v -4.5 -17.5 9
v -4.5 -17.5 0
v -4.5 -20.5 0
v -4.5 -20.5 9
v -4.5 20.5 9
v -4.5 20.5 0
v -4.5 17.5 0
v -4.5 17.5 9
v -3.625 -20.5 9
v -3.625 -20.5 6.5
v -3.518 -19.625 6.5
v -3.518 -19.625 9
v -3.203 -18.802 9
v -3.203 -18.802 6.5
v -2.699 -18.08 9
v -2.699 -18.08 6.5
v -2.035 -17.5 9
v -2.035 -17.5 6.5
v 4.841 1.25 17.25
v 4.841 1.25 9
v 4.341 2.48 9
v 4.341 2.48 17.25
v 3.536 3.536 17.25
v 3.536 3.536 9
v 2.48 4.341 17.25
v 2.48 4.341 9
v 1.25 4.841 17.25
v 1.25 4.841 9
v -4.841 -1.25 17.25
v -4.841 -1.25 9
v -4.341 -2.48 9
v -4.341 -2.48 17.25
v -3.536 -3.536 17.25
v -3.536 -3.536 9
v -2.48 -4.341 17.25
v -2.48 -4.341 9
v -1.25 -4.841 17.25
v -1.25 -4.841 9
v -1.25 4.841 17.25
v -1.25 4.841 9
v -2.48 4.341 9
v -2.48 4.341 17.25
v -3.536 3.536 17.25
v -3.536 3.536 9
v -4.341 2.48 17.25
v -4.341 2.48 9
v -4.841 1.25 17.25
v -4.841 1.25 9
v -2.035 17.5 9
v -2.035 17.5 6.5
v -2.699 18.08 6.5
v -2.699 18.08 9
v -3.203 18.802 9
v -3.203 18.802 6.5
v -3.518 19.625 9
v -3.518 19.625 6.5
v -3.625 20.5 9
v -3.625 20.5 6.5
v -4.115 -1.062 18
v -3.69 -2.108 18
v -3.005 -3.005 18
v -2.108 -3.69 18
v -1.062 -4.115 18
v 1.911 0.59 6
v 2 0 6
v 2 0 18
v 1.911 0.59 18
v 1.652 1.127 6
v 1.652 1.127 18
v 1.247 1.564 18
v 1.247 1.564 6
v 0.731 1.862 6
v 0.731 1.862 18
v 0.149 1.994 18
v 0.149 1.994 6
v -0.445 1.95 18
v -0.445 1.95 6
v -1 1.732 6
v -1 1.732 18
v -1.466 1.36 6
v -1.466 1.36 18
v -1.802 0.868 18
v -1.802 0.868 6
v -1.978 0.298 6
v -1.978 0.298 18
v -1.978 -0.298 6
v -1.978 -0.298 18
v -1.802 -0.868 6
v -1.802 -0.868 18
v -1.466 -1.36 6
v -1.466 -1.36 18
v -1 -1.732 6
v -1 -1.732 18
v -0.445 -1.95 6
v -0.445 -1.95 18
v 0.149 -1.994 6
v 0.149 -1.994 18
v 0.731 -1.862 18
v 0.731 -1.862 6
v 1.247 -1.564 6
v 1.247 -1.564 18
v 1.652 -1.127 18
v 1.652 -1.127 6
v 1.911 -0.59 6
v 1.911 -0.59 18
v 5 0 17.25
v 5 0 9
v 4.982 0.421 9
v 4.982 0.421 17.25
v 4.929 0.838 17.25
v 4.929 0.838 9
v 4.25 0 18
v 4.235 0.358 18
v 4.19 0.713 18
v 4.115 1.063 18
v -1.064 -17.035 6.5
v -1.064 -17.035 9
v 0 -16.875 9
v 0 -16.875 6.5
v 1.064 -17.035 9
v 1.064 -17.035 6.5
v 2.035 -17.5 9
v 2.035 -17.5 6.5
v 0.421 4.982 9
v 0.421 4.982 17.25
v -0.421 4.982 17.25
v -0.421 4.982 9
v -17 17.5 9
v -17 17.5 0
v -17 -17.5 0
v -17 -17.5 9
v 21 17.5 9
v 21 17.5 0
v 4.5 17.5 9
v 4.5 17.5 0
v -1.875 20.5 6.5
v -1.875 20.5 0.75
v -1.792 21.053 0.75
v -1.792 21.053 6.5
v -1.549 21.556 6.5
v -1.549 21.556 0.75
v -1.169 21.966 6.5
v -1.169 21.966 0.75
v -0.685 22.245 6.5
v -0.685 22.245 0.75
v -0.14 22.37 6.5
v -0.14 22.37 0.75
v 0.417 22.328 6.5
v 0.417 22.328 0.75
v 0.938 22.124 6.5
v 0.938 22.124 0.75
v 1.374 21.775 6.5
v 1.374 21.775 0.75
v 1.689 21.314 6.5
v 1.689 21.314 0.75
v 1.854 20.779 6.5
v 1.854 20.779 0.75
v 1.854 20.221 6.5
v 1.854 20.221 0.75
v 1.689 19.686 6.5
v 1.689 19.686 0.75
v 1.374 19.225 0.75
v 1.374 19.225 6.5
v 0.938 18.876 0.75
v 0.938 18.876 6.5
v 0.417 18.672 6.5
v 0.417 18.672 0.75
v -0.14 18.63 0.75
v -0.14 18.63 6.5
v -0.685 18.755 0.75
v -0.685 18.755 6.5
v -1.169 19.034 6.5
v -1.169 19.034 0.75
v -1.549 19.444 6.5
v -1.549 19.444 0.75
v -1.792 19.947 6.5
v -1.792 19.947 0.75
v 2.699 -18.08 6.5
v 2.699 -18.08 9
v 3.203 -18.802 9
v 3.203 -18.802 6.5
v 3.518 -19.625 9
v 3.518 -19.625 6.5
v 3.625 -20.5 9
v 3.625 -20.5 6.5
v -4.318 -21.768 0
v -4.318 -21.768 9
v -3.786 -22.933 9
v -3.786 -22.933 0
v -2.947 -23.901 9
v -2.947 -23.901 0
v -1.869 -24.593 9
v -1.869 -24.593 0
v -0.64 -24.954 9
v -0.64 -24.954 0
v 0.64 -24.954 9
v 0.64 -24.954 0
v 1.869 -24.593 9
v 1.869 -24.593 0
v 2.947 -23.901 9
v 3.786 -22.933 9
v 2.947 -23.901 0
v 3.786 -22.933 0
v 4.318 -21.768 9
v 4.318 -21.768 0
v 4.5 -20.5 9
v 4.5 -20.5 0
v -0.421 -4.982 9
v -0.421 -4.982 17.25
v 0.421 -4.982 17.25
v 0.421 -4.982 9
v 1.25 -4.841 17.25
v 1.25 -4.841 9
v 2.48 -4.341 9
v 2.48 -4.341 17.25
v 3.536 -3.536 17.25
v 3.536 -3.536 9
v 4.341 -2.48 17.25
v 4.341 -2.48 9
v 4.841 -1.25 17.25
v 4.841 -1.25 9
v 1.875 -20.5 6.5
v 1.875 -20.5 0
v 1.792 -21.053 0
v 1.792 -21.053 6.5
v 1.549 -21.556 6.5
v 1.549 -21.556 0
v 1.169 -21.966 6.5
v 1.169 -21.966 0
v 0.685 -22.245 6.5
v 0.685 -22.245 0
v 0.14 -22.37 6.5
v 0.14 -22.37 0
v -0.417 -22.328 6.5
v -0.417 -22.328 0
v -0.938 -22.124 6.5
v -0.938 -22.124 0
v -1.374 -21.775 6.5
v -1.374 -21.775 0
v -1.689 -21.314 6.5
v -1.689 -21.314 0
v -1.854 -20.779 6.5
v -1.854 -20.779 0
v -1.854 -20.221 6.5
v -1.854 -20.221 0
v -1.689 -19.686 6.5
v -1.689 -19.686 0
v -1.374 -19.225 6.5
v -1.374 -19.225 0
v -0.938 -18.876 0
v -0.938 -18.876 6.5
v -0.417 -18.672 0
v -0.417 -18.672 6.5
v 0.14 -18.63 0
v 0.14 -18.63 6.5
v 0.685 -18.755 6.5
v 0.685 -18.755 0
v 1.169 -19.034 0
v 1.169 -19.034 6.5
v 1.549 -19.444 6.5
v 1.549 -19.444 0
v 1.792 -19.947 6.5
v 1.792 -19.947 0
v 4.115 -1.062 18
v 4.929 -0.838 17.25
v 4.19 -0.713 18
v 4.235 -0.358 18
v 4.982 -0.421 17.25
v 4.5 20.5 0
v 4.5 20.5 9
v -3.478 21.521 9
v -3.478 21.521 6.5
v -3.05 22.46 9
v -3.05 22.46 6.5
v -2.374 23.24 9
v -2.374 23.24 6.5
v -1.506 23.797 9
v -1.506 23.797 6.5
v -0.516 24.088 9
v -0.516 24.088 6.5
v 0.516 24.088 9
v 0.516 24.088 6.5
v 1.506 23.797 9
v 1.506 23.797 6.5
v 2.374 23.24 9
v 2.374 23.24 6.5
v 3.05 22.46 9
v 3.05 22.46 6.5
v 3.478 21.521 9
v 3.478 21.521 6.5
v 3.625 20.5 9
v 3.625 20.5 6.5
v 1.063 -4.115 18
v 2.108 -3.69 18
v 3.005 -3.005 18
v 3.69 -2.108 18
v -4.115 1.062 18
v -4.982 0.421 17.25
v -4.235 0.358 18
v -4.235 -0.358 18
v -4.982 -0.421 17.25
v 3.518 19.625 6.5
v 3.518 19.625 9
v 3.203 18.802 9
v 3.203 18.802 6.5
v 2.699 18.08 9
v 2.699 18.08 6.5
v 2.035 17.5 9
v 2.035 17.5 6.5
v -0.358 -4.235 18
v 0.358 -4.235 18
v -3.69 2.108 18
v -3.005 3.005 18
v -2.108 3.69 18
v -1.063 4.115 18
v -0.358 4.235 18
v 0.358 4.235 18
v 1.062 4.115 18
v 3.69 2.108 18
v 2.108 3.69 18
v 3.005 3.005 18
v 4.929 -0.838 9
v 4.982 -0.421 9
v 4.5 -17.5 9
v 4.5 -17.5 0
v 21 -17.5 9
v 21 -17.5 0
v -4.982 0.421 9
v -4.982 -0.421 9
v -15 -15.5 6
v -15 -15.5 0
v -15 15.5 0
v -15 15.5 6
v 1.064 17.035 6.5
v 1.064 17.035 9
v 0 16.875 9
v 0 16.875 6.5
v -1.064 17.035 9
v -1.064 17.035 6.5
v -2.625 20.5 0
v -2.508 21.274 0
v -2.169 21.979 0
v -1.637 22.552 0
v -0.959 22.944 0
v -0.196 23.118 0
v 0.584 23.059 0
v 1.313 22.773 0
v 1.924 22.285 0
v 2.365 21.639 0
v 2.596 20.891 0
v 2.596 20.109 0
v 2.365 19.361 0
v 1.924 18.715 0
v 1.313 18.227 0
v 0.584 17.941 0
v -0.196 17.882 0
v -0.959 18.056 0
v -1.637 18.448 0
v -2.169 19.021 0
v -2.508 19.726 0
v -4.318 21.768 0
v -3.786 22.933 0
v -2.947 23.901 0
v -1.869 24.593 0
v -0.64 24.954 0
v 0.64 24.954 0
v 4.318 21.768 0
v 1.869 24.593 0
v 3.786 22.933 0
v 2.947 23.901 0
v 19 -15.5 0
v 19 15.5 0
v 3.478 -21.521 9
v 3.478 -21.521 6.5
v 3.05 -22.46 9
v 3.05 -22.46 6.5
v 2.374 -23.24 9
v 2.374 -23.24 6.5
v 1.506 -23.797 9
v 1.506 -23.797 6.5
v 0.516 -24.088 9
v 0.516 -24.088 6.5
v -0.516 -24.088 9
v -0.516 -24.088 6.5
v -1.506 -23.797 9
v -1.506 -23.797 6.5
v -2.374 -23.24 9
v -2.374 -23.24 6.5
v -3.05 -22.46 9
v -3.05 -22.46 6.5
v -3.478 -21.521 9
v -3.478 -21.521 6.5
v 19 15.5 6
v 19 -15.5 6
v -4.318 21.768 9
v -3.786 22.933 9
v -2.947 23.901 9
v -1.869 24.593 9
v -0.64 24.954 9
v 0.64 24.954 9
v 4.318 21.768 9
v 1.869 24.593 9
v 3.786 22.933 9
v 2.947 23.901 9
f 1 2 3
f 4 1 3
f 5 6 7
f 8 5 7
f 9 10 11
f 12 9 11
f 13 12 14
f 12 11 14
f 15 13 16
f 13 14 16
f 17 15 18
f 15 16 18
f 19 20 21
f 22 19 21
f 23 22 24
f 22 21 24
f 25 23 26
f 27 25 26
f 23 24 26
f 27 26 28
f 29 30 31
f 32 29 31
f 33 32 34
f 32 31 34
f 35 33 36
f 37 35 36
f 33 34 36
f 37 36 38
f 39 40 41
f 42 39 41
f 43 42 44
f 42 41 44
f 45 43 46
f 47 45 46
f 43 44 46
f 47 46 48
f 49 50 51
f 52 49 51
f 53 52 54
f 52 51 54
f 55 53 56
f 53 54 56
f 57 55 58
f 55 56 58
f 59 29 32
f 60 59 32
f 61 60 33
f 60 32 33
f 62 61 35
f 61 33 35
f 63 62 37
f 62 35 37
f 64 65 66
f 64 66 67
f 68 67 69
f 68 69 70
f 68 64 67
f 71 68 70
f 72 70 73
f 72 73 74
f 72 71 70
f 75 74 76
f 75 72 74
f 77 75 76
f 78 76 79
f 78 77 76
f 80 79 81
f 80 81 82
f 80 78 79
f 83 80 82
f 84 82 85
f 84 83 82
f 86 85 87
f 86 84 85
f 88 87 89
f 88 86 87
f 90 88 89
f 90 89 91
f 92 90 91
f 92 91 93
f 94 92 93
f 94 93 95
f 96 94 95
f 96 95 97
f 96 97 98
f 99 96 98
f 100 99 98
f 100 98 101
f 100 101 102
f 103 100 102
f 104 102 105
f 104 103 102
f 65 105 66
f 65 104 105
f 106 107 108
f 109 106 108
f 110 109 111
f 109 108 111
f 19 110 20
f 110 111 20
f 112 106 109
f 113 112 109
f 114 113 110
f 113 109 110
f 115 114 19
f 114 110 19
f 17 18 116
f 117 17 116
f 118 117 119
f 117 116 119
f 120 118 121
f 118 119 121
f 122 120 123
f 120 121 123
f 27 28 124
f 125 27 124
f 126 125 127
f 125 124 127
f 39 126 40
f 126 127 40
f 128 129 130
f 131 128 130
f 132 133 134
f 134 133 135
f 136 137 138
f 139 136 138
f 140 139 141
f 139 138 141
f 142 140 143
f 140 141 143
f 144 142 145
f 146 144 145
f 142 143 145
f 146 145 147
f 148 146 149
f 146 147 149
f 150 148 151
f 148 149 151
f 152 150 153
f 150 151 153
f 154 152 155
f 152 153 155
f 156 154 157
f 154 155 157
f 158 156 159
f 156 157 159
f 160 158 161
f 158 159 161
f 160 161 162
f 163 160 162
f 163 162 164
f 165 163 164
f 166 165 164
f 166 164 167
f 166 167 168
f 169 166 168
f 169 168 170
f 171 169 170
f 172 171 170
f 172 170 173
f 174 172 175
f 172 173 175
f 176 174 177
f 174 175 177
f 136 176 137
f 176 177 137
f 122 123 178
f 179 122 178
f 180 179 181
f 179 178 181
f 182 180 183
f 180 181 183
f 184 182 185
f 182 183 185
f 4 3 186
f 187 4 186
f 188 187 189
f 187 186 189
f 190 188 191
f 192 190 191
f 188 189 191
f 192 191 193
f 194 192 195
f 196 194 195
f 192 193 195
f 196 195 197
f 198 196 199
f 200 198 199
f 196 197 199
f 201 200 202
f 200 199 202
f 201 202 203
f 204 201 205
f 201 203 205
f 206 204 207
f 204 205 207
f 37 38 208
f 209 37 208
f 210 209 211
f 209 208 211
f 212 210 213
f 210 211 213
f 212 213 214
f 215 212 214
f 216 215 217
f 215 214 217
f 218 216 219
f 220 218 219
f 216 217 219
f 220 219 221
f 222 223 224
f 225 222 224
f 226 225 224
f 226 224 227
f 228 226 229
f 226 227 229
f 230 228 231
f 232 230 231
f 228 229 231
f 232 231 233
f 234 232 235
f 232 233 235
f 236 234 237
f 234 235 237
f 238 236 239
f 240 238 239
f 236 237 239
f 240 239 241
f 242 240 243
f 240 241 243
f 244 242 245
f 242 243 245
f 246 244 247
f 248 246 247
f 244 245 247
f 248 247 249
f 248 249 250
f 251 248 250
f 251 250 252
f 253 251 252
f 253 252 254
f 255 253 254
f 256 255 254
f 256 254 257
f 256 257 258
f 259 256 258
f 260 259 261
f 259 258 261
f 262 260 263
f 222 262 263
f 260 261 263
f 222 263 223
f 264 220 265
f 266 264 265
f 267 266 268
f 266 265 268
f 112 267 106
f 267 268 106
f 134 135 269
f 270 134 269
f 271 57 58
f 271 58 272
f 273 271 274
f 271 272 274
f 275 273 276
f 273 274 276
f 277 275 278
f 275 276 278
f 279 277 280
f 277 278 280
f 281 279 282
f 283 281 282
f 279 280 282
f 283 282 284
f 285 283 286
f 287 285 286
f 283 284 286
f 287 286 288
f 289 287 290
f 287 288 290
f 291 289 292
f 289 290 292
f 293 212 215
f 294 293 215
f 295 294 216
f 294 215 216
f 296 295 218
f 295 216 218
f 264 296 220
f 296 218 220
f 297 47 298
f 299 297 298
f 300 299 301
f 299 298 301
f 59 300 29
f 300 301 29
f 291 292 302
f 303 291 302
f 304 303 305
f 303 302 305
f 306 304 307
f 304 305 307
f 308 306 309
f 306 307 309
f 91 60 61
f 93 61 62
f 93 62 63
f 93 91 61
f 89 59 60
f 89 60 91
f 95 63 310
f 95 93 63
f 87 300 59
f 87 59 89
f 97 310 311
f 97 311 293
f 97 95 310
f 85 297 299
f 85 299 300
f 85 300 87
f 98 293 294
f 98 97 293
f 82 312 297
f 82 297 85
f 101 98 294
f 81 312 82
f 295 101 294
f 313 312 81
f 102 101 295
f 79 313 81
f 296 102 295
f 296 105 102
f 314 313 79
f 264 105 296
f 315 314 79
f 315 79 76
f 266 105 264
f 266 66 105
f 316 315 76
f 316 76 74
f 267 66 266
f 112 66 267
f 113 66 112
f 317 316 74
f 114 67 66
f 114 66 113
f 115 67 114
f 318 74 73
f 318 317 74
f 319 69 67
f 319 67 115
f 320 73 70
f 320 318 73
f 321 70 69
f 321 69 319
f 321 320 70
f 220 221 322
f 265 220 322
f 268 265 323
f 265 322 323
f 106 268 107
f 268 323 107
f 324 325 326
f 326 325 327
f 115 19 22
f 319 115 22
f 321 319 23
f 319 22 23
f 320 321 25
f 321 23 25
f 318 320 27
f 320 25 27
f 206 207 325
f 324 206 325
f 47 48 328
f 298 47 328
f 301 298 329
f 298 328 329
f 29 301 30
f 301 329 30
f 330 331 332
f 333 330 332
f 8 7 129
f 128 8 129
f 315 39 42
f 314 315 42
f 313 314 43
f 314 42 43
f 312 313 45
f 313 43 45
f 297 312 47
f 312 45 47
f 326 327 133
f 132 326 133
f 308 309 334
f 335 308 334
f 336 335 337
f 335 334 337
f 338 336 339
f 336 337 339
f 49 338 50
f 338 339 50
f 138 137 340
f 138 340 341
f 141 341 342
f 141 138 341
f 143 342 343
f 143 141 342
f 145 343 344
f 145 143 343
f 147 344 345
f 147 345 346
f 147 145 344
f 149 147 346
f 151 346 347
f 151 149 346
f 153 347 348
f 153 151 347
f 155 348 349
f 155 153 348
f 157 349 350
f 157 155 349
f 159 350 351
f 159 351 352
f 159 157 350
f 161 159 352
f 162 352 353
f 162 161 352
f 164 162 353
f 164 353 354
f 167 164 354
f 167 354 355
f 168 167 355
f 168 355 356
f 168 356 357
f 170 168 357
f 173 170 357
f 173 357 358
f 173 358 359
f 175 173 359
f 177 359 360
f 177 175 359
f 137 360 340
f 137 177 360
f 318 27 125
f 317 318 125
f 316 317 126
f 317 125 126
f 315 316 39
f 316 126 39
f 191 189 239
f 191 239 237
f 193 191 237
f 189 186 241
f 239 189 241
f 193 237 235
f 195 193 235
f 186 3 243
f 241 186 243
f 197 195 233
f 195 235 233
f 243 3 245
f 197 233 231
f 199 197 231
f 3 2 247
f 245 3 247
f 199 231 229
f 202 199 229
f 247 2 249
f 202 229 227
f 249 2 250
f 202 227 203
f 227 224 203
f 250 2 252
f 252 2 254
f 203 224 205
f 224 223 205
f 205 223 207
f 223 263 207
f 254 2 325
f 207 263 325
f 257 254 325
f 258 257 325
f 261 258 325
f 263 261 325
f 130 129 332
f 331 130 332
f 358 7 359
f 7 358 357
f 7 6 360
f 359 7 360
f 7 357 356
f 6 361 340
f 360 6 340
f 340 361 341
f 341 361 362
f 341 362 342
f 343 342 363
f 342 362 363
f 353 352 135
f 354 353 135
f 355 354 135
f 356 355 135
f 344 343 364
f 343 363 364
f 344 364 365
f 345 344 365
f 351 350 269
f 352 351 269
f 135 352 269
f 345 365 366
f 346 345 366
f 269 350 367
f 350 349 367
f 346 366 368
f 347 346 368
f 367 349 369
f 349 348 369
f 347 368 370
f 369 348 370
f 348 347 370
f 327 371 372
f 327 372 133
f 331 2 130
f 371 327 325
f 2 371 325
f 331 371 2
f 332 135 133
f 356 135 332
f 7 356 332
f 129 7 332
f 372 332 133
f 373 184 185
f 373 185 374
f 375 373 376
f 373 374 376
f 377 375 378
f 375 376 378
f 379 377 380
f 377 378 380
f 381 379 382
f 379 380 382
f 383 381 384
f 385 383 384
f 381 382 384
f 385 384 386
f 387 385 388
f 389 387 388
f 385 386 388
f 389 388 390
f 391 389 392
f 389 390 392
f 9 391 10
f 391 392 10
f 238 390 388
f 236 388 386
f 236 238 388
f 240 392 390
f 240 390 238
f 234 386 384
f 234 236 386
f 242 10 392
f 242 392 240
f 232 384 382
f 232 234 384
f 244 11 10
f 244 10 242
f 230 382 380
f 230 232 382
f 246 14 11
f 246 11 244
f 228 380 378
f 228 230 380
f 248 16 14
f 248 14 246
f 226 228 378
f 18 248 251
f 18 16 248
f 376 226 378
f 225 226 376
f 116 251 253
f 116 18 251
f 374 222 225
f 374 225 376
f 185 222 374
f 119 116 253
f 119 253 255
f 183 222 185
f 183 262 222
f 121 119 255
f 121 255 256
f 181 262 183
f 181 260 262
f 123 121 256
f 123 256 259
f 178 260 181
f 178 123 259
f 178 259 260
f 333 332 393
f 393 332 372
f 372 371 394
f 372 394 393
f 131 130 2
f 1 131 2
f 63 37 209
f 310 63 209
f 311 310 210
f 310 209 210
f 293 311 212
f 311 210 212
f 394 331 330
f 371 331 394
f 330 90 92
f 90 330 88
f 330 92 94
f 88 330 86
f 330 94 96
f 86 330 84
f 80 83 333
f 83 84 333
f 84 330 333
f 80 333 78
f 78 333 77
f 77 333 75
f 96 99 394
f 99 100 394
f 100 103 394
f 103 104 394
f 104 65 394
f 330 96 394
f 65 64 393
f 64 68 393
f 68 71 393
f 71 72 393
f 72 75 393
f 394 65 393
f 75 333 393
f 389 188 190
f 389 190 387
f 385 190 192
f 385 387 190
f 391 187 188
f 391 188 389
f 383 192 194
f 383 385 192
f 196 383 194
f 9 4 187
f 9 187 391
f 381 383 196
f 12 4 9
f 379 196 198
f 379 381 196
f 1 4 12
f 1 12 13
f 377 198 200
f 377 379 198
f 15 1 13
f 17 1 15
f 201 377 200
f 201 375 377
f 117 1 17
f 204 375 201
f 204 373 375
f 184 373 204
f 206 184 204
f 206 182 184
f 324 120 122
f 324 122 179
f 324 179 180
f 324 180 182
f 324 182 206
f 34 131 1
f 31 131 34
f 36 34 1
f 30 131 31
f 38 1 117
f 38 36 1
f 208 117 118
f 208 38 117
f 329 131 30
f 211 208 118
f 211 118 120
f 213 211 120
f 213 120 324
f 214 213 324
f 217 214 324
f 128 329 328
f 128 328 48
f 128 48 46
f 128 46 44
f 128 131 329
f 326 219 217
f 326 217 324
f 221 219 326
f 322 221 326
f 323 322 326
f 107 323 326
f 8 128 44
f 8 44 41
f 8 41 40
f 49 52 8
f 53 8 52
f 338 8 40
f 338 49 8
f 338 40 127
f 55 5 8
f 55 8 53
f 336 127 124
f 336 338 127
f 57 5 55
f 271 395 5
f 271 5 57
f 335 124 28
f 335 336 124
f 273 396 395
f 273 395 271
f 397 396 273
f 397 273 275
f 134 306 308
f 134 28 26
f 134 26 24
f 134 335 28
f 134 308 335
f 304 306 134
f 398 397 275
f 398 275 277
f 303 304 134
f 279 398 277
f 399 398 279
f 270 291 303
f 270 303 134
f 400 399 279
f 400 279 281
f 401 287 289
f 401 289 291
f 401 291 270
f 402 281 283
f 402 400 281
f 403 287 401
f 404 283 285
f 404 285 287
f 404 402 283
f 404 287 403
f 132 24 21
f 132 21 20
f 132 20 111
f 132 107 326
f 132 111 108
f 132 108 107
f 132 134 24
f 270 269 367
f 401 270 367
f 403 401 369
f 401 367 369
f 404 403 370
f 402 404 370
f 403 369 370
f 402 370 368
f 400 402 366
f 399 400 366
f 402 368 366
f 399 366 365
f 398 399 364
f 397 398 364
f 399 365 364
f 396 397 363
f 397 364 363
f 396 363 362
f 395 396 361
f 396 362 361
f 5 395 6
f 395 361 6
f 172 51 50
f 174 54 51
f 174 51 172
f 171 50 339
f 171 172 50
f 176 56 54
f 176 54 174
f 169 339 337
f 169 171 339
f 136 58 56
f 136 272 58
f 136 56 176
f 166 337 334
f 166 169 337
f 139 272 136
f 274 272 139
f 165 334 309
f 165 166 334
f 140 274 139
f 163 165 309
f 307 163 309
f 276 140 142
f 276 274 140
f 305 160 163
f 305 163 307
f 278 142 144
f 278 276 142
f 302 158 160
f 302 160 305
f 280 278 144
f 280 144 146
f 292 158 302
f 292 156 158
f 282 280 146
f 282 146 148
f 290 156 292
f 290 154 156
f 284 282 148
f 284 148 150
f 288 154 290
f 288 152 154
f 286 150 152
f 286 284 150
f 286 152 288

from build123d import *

# Parameters (mm, degrees)
F0_W     = 34
F0_H     = 31
F1_DEPTH = 9
F2_DEPTH = 6.5
F3_START = 6
F0_W_2   = 2.5
F0_H_2   = 3
F3_DEPTH = 3
F4_START = 6
F0_R     = 2
F4_DEPTH = 12
F5_SIZE  = 0.75
F6_SIZE  = 0.75


with BuildPart() as f1:
    # F0 (on Top) → F1 (new body)
    with BuildSketch(Plane.XY):
        with BuildLine():
            Line((-4.5, 17.5), (-17, 17.5))
            Line((-17, 17.5), (-17, -17.5))
            Line((-17, -17.5), (-4.5, -17.5))
            Line((-4.5, -17.5), (-2.0348525745, -17.5))
            ThreePointArc((-2.0348525745, -17.5), (0, -16.875), (2.0348525745, -17.5))
            Line((2.0348525745, -17.5), (4.5, -17.5))
            Line((4.5, -17.5), (21, -17.5))
            Line((21, -17.5), (21, 17.5))
            Line((21, 17.5), (4.5, 17.5))
            Line((4.5, 17.5), (2.0348525745, 17.5))
            ThreePointArc((2.0348525745, 17.5), (0, 16.875), (-2.0348525745, 17.5))
            Line((-2.0348525745, 17.5), (-4.5, 17.5))
        make_face()
        with Locations((2, 0)):
            Rectangle(F0_W, F0_H, mode=Mode.SUBTRACT)
        with BuildLine():
            Line((-4.5, 20.5), (-4.5, 17.5))
            Line((-4.5, 17.5), (-2.0348525745, 17.5))
            ThreePointArc((-2.0348525745, 17.5), (-3.2028866342, 18.8023126882), (-3.625, 20.5))
            Line((-3.625, 20.5), (-4.5, 20.5))
        make_face()
        with BuildLine():
            ThreePointArc((4.5, 20.5), (0, 25), (-4.5, 20.5))
            Line((-4.5, 20.5), (-3.625, 20.5))
            ThreePointArc((-3.625, 20.5), (0, 24.125), (3.625, 20.5))
            Line((3.625, 20.5), (4.5, 20.5))
        make_face()
        with BuildLine():
            ThreePointArc((3.625, 20.5), (3.2028866342, 18.8023126882), (2.0348525745, 17.5))
            Line((2.0348525745, 17.5), (4.5, 17.5))
            Line((4.5, 17.5), (4.5, 20.5))
            Line((4.5, 20.5), (3.625, 20.5))
        make_face()
        with BuildLine():
            Line((4.5, -17.5), (2.0348525745, -17.5))
            ThreePointArc((2.0348525745, -17.5), (3.2028866342, -18.8023126882), (3.625, -20.5))
            Line((3.625, -20.5), (4.5, -20.5))
            Line((4.5, -20.5), (4.5, -17.5))
        make_face()
        with BuildLine():
            Line((-2.0348525745, -17.5), (-4.5, -17.5))
            Line((-4.5, -17.5), (-4.5, -20.5))
            Line((-4.5, -20.5), (-3.625, -20.5))
            ThreePointArc((-3.625, -20.5), (-3.2028866342, -18.8023126882), (-2.0348525745, -17.5))
        make_face()
        with BuildLine():
            Line((-3.625, -20.5), (-4.5, -20.5))
            ThreePointArc((-4.5, -20.5), (0, -25), (4.5, -20.5))
            Line((4.5, -20.5), (3.625, -20.5))
            ThreePointArc((3.625, -20.5), (0, -24.125), (-3.625, -20.5))
        make_face()
    extrude(amount=F1_DEPTH)

    # F0 (on Top) → F2 (join)
    with BuildSketch(Plane.XY):
        with BuildLine():
            ThreePointArc((-3.625, 20.5), (-3.2028866342, 18.8023126882), (-2.0348525745, 17.5))
            Line((-2.0348525745, 17.5), (2.0348525745, 17.5))
            ThreePointArc((2.0348525745, 17.5), (3.2028866342, 18.8023126882), (3.625, 20.5))
            Line((3.625, 20.5), (1.875, 20.5))
            ThreePointArc((1.875, 20.5), (0, 18.625), (-1.875, 20.5))
            Line((-1.875, 20.5), (-3.625, 20.5))
        make_face()
        with BuildLine():
            Line((2.0348525745, 17.5), (-2.0348525745, 17.5))
            ThreePointArc((-2.0348525745, 17.5), (0, 16.875), (2.0348525745, 17.5))
        make_face()
        with BuildLine():
            ThreePointArc((3.625, 20.5), (0, 24.125), (-3.625, 20.5))
            Line((-3.625, 20.5), (-1.875, 20.5))
            ThreePointArc((-1.875, 20.5), (0, 22.375), (1.875, 20.5))
            Line((1.875, 20.5), (3.625, 20.5))
        make_face()
        with BuildLine():
            Line((2.0348525745, -17.5), (-2.0348525745, -17.5))
            ThreePointArc((-2.0348525745, -17.5), (-3.2028866342, -18.8023126882), (-3.625, -20.5))
            Line((-3.625, -20.5), (-1.875, -20.5))
            ThreePointArc((-1.875, -20.5), (0, -18.625), (1.875, -20.5))
            Line((1.875, -20.5), (3.625, -20.5))
            ThreePointArc((3.625, -20.5), (3.2028866342, -18.8023126882), (2.0348525745, -17.5))
        make_face()
        with BuildLine():
            ThreePointArc((2.0348525745, -17.5), (0, -16.875), (-2.0348525745, -17.5))
            Line((-2.0348525745, -17.5), (2.0348525745, -17.5))
        make_face()
        with BuildLine():
            Line((-1.875, -20.5), (-3.625, -20.5))
            ThreePointArc((-3.625, -20.5), (0, -24.125), (3.625, -20.5))
            Line((3.625, -20.5), (1.875, -20.5))
            ThreePointArc((1.875, -20.5), (0, -22.375), (-1.875, -20.5))
        make_face()
    extrude(amount=F2_DEPTH)

    # F0 (on Top) → F3 (join)
    with BuildSketch(Plane.XY.offset(F3_START)):
        with Locations((2, 0)):
            Rectangle(F0_W, F0_H)
        with BuildLine():
            ThreePointArc((1.25, 4.8412291828), (3.5355339059, 3.5355339059), (4.8412291828, 1.25))
            Line((4.8412291828, 1.25), (11.5, 1.25))
            Line((11.5, 1.25), (11.5, 4.25))
            Line((11.5, 4.25), (14, 4.25))
            Line((14, 4.25), (14, 1.25))
            Line((14, 1.25), (14, -1.25))
            Line((14, -1.25), (14, -4.25))
            Line((14, -4.25), (11.5, -4.25))
            Line((11.5, -4.25), (11.5, -1.25))
            Line((11.5, -1.25), (4.8412291828, -1.25))
            ThreePointArc((4.8412291828, -1.25), (3.5355339059, -3.5355339059), (1.25, -4.8412291828))
            Line((1.25, -4.8412291828), (1.25, -8))
            Line((1.25, -8), (15, -8))
            Line((15, -8), (15, -10.5))
            Line((15, -10.5), (-11, -10.5))
            Line((-11, -10.5), (-11, -8))
            Line((-11, -8), (-1.25, -8))
            Line((-1.25, -8), (-1.25, -4.8412291828))
            ThreePointArc((-1.25, -4.8412291828), (-3.5355339059, -3.5355339059), (-4.8412291828, -1.25))
            Line((-4.8412291828, -1.25), (-7.5, -1.25))
            Line((-7.5, -1.25), (-7.5, -4.25))
            Line((-7.5, -4.25), (-10, -4.25))
            Line((-10, -4.25), (-10, -1.25))
            Line((-10, -1.25), (-10, 1.25))
            Line((-10, 1.25), (-10, 4.25))
            Line((-10, 4.25), (-7.5, 4.25))
            Line((-7.5, 4.25), (-7.5, 1.25))
            Line((-7.5, 1.25), (-4.8412291828, 1.25))
            ThreePointArc((-4.8412291828, 1.25), (-3.5355339059, 3.5355339059), (-1.25, 4.8412291828))
            Line((-1.25, 4.8412291828), (-1.25, 8))
            Line((-1.25, 8), (-11, 8))
            Line((-11, 8), (-11, 10.5))
            Line((-11, 10.5), (15, 10.5))
            Line((15, 10.5), (15, 8))
            Line((15, 8), (1.25, 8))
            Line((1.25, 8), (1.25, 4.8412291828))
        make_face(mode=Mode.SUBTRACT)
        with Locations((-8.75, 2.75)):
            Rectangle(F0_W_2, F0_H_2)
        with BuildLine():
            ThreePointArc((-4.8412291828, -1.25), (-5, 0), (-4.8412291828, 1.25))
            Line((-4.8412291828, 1.25), (-7.5, 1.25))
            Line((-7.5, 1.25), (-10, 1.25))
            Line((-10, 1.25), (-10, -1.25))
            Line((-10, -1.25), (-7.5, -1.25))
            Line((-7.5, -1.25), (-4.8412291828, -1.25))
        make_face()
        with Locations((-8.75, -2.75)):
            Rectangle(F0_W_2, F0_H_2)
        Polygon((15, -8), (1.25, -8), (-1.25, -8), (-11, -8), (-11, -10.5), (15, -10.5), align=None)
        with BuildLine():
            Line((1.25, -8), (1.25, -4.8412291828))
            ThreePointArc((1.25, -4.8412291828), (0, -5), (-1.25, -4.8412291828))
            Line((-1.25, -4.8412291828), (-1.25, -8))
            Line((-1.25, -8), (1.25, -8))
        make_face()
        with Locations((12.75, -2.75)):
            Rectangle(F0_W_2, F0_H_2)
        with Locations((12.75, 2.75)):
            Rectangle(F0_W_2, F0_H_2)
        with BuildLine():
            ThreePointArc((4.8412291828, 1.25), (4.9601484813, 0.6300214624), (5, 0))
            ThreePointArc((5, 0), (4.9601484813, -0.6300214624), (4.8412291828, -1.25))
            Line((4.8412291828, -1.25), (11.5, -1.25))
            Line((11.5, -1.25), (14, -1.25))
            Line((14, -1.25), (14, 1.25))
            Line((14, 1.25), (11.5, 1.25))
            Line((11.5, 1.25), (4.8412291828, 1.25))
        make_face()
        Polygon((-1.25, 8), (1.25, 8), (15, 8), (15, 10.5), (-11, 10.5), (-11, 8), align=None)
        with BuildLine():
            ThreePointArc((-1.25, 4.8412291828), (0, 5), (1.25, 4.8412291828))
            Line((1.25, 4.8412291828), (1.25, 8))
            Line((1.25, 8), (-1.25, 8))
            Line((-1.25, 8), (-1.25, 4.8412291828))
        make_face()
    extrude(amount=F3_DEPTH)

    # F0 (on Top) → F4 (join)
    with BuildSketch(Plane.XY.offset(F4_START)):
        with BuildLine():
            Line((2.5, 1.25), (4.8412291828, 1.25))
            ThreePointArc((4.8412291828, 1.25), (3.5355339059, 3.5355339059), (1.25, 4.8412291828))
            Line((1.25, 4.8412291828), (1.25, 2.5))
            Line((1.25, 2.5), (-1.25, 2.5))
            Line((-1.25, 2.5), (-1.25, 4.8412291828))
            ThreePointArc((-1.25, 4.8412291828), (-3.5355339059, 3.5355339059), (-4.8412291828, 1.25))
            Line((-4.8412291828, 1.25), (-2.5, 1.25))
            Line((-2.5, 1.25), (-2.5, -1.25))
            Line((-2.5, -1.25), (-4.8412291828, -1.25))
            ThreePointArc((-4.8412291828, -1.25), (-3.5355339059, -3.5355339059), (-1.25, -4.8412291828))
            Line((-1.25, -4.8412291828), (-1.25, -2.5))
            Line((-1.25, -2.5), (1.25, -2.5))
            Line((1.25, -2.5), (1.25, -4.8412291828))
            ThreePointArc((1.25, -4.8412291828), (3.5355339059, -3.5355339059), (4.8412291828, -1.25))
            Line((4.8412291828, -1.25), (2.5, -1.25))
            Line((2.5, -1.25), (2.5, 1.25))
        make_face()
        Circle(F0_R, mode=Mode.SUBTRACT)
        with BuildLine():
            Line((-2.5, 1.25), (-4.8412291828, 1.25))
            ThreePointArc((-4.8412291828, 1.25), (-5, 0), (-4.8412291828, -1.25))
            Line((-4.8412291828, -1.25), (-2.5, -1.25))
            Line((-2.5, -1.25), (-2.5, 1.25))
        make_face()
        with BuildLine():
            ThreePointArc((-1.25, -4.8412291828), (0, -5), (1.25, -4.8412291828))
            Line((1.25, -4.8412291828), (1.25, -2.5))
            Line((1.25, -2.5), (-1.25, -2.5))
            Line((-1.25, -2.5), (-1.25, -4.8412291828))
        make_face()
        with BuildLine():
            ThreePointArc((4.8412291828, -1.25), (4.9601484813, -0.6300214624), (5, 0))
            ThreePointArc((5, 0), (4.9601484813, 0.6300214624), (4.8412291828, 1.25))
            Line((4.8412291828, 1.25), (2.5, 1.25))
            Line((2.5, 1.25), (2.5, -1.25))
            Line((2.5, -1.25), (4.8412291828, -1.25))
        make_face()
        with BuildLine():
            Line((1.25, 2.5), (1.25, 4.8412291828))
            ThreePointArc((1.25, 4.8412291828), (0, 5), (-1.25, 4.8412291828))
            Line((-1.25, 4.8412291828), (-1.25, 2.5))
            Line((-1.25, 2.5), (1.25, 2.5))
        make_face()
    extrude(amount=F4_DEPTH)

    # F5
    f5_edges = [f1.edges().sort_by_distance(p)[0] for p in [
        (-1.25, -4.841229, 18),
    ]]
    chamfer(f5_edges, length=F5_SIZE)

    # F6
    f6_edges = [f1.edges().sort_by_distance(p)[0] for p in [
        (1.875, 20.5, 0),
    ]]
    chamfer(f6_edges, length=F6_SIZE)


solid = f1.part
